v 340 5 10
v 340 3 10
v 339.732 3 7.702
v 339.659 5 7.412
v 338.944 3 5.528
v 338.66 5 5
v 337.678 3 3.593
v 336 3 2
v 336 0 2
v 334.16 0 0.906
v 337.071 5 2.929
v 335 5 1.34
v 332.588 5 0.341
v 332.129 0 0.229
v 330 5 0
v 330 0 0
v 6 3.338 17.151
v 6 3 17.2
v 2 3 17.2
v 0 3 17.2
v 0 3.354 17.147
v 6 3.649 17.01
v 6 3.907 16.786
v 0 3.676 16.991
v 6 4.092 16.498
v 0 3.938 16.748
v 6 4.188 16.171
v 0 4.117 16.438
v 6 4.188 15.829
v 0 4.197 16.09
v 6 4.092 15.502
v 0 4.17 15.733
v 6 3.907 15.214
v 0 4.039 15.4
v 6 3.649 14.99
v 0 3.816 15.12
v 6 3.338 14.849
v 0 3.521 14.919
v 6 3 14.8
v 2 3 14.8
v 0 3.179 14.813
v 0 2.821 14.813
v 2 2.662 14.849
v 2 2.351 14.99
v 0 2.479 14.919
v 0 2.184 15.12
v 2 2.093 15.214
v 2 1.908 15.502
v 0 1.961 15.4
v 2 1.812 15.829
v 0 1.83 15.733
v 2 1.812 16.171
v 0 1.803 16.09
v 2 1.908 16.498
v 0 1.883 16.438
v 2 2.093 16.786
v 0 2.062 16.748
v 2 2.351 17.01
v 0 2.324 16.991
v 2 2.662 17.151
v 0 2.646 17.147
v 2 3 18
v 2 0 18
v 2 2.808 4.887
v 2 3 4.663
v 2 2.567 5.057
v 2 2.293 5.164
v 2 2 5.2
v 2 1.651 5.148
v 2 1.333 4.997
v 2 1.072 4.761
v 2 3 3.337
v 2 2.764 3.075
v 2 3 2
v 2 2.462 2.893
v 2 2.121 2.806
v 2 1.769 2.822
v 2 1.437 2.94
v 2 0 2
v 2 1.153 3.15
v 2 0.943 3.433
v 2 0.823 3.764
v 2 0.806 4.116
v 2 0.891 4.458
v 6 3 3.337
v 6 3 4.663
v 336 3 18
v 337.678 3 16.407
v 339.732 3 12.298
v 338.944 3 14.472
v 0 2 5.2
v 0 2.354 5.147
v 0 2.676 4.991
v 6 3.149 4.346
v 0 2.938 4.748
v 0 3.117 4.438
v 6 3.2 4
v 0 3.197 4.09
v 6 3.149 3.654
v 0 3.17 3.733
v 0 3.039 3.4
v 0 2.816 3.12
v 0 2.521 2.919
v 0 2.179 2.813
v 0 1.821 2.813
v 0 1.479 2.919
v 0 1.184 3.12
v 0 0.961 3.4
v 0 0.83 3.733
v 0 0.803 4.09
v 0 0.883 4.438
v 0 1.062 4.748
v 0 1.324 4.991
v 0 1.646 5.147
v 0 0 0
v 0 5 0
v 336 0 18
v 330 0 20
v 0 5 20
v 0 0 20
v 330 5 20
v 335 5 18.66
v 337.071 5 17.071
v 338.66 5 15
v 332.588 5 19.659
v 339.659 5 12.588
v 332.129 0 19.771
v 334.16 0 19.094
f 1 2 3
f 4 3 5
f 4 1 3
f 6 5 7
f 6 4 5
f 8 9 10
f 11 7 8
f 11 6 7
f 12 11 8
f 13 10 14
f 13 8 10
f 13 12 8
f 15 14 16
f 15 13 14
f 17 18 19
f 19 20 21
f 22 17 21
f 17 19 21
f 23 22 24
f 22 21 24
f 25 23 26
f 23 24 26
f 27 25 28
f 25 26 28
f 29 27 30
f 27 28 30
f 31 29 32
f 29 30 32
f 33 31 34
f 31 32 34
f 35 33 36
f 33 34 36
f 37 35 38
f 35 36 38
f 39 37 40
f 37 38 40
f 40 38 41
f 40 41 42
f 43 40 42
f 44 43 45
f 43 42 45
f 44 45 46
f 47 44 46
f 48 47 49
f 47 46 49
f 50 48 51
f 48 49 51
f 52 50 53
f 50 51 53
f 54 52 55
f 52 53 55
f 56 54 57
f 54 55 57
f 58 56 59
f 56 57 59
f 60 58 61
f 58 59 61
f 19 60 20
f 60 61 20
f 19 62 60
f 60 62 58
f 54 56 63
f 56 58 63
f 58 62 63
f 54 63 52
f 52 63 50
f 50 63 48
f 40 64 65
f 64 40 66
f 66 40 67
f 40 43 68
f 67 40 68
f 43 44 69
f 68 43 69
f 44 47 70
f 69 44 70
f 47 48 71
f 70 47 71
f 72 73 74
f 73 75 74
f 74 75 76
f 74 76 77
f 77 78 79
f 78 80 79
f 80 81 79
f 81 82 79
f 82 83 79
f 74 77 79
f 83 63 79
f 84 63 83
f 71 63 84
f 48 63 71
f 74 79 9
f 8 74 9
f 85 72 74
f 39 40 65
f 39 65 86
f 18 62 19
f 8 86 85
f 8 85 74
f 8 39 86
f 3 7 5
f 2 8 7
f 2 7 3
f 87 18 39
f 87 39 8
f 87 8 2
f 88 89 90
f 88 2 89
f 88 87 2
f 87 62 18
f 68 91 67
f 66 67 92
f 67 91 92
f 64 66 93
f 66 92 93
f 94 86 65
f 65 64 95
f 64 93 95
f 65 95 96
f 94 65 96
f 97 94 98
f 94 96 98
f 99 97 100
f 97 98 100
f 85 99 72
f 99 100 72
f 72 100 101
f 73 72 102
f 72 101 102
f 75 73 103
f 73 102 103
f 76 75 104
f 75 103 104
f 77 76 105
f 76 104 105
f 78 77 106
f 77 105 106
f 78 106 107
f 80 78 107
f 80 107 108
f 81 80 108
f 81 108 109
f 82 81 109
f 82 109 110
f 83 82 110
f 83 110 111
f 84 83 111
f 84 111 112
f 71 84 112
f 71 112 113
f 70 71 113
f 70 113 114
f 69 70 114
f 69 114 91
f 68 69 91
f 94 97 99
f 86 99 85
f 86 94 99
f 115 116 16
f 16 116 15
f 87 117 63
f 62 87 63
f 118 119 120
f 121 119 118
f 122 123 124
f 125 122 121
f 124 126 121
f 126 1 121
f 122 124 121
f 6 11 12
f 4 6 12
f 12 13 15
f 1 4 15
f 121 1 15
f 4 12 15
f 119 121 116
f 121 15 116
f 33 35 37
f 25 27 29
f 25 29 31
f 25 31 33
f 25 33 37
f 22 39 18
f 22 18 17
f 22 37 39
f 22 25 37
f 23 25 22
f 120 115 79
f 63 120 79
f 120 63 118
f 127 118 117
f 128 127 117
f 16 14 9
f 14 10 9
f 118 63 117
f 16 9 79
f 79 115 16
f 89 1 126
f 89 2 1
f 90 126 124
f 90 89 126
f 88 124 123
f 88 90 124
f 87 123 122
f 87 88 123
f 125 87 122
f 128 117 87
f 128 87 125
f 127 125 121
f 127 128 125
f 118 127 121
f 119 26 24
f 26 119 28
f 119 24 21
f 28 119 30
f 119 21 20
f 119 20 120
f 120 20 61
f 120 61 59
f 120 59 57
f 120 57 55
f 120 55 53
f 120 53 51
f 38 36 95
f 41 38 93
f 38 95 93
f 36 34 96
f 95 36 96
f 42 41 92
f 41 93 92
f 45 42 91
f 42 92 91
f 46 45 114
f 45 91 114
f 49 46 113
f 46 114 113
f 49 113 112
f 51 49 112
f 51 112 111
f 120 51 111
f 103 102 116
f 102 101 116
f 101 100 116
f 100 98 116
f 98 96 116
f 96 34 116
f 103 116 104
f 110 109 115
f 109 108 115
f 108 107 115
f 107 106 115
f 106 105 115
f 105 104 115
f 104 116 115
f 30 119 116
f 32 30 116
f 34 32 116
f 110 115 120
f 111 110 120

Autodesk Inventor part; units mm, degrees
ref_plane "YZ Plane" through (0, 0, 0) normal (1, 0, 0) x (0, 1, 0)
ref_plane "XZ Plane" through (0, 0, 0) normal (0, 1, 0) x (-1, 0, 0)
ref_plane "XY Plane" through (0, 0, 0) normal (0, 0, 1) x (1, 0, 0)
sketch "スケッチ1" plane through (0, 0, 0) normal (0, 0, 1) x (1, 0, 0)
  line L0 (0, 0) -> (352, 0)
  line L1 (352, 0) -> (352, 5)
  line L2 (352, 5) -> (0, 5)
  line L3 (0, 5) -> (0, 0)
  line L4 (0, 0) -> (6, 0)
  line L5 (0, 1) -> (0, 0)
  dimension "d0" = 352
  dimension "d1" = 5
extrude "押し出し1" add sketch "スケッチ1" along normal blind 20
sketch "スケッチ3" plane through (0, 0, 0) normal (-1, 0, 0) x (0, 0, 1)
  line L0 (0, 5) -> (0, 0) projected
  line L1 (0, 0) -> (20, 0) projected
  line L2 (20, 5) -> (20, 0) projected
  line L3 (0, 5) -> (20, 5) projected
  circle A0 centre (4, 2) radius 1.2
  circle A1 centre (16, 3) radius 1.2
  dimension "d14" = 2.4
  dimension "d15" = 2.4
  dimension "d16" = 3
  dimension "d17" = 4
  dimension "d18" = 4
  dimension "d19" = 3
extrude "押し出し3" cut sketch "スケッチ3" against normal blind 6 contours A0 | A1
sketch "スケッチ4" plane through (0, 0, 0) normal (0, -1, 0) x (1, 0, 0)
  line L0 (0, 0) -> (352, 0) projected
  line L1 (352, 0) -> (352, 20) projected
  line L2 (0, 20) -> (352, 20) projected
  line L3 (0, 0) -> (0, 20) projected
  line L4 (2, 2) -> (350, 2)
  line L5 (350, 2) -> (350, 18)
  line L6 (350, 18) -> (2, 18)
  line L7 (2, 18) -> (2, 2)
  dimension "d22" = 2
  dimension "d23" = 2
  dimension "d24" = 2
  dimension "d25" = 2
extrude "押し出し4" cut sketch "スケッチ4" against normal blind 3 contours L7 L6 L5 L4
sketch "スケッチ5" plane through (0, 0, 0) normal (0, 0, -1) x (-1, 0, 0)
  line L0 (-352, 0) -> (-352, 5) projected
  line L1 (0, 0) -> (-352, 0) projected
  line L2 (-352, 5) -> (0, 5) projected
  line L3 (-352, 0) -> (-352, 5) projected
  line L4 (-352, 5) -> (0, 5) projected
  line L5 (-352, 0) -> (-340, 0)
  line L6 (-340, 0) -> (-340, 5)
  line L7 (-340, 5) -> (-352, 5)
  line L8 (-352, 5) -> (-352, 0)
  dimension "d28" = 12
extrude "押し出し5" cut sketch "スケッチ5" against normal through all
fillet "フィレット1" radius 10 2 edges at (340, 2.5, 0) (340, 2.5, 20)
properties part number "arm1_L"
